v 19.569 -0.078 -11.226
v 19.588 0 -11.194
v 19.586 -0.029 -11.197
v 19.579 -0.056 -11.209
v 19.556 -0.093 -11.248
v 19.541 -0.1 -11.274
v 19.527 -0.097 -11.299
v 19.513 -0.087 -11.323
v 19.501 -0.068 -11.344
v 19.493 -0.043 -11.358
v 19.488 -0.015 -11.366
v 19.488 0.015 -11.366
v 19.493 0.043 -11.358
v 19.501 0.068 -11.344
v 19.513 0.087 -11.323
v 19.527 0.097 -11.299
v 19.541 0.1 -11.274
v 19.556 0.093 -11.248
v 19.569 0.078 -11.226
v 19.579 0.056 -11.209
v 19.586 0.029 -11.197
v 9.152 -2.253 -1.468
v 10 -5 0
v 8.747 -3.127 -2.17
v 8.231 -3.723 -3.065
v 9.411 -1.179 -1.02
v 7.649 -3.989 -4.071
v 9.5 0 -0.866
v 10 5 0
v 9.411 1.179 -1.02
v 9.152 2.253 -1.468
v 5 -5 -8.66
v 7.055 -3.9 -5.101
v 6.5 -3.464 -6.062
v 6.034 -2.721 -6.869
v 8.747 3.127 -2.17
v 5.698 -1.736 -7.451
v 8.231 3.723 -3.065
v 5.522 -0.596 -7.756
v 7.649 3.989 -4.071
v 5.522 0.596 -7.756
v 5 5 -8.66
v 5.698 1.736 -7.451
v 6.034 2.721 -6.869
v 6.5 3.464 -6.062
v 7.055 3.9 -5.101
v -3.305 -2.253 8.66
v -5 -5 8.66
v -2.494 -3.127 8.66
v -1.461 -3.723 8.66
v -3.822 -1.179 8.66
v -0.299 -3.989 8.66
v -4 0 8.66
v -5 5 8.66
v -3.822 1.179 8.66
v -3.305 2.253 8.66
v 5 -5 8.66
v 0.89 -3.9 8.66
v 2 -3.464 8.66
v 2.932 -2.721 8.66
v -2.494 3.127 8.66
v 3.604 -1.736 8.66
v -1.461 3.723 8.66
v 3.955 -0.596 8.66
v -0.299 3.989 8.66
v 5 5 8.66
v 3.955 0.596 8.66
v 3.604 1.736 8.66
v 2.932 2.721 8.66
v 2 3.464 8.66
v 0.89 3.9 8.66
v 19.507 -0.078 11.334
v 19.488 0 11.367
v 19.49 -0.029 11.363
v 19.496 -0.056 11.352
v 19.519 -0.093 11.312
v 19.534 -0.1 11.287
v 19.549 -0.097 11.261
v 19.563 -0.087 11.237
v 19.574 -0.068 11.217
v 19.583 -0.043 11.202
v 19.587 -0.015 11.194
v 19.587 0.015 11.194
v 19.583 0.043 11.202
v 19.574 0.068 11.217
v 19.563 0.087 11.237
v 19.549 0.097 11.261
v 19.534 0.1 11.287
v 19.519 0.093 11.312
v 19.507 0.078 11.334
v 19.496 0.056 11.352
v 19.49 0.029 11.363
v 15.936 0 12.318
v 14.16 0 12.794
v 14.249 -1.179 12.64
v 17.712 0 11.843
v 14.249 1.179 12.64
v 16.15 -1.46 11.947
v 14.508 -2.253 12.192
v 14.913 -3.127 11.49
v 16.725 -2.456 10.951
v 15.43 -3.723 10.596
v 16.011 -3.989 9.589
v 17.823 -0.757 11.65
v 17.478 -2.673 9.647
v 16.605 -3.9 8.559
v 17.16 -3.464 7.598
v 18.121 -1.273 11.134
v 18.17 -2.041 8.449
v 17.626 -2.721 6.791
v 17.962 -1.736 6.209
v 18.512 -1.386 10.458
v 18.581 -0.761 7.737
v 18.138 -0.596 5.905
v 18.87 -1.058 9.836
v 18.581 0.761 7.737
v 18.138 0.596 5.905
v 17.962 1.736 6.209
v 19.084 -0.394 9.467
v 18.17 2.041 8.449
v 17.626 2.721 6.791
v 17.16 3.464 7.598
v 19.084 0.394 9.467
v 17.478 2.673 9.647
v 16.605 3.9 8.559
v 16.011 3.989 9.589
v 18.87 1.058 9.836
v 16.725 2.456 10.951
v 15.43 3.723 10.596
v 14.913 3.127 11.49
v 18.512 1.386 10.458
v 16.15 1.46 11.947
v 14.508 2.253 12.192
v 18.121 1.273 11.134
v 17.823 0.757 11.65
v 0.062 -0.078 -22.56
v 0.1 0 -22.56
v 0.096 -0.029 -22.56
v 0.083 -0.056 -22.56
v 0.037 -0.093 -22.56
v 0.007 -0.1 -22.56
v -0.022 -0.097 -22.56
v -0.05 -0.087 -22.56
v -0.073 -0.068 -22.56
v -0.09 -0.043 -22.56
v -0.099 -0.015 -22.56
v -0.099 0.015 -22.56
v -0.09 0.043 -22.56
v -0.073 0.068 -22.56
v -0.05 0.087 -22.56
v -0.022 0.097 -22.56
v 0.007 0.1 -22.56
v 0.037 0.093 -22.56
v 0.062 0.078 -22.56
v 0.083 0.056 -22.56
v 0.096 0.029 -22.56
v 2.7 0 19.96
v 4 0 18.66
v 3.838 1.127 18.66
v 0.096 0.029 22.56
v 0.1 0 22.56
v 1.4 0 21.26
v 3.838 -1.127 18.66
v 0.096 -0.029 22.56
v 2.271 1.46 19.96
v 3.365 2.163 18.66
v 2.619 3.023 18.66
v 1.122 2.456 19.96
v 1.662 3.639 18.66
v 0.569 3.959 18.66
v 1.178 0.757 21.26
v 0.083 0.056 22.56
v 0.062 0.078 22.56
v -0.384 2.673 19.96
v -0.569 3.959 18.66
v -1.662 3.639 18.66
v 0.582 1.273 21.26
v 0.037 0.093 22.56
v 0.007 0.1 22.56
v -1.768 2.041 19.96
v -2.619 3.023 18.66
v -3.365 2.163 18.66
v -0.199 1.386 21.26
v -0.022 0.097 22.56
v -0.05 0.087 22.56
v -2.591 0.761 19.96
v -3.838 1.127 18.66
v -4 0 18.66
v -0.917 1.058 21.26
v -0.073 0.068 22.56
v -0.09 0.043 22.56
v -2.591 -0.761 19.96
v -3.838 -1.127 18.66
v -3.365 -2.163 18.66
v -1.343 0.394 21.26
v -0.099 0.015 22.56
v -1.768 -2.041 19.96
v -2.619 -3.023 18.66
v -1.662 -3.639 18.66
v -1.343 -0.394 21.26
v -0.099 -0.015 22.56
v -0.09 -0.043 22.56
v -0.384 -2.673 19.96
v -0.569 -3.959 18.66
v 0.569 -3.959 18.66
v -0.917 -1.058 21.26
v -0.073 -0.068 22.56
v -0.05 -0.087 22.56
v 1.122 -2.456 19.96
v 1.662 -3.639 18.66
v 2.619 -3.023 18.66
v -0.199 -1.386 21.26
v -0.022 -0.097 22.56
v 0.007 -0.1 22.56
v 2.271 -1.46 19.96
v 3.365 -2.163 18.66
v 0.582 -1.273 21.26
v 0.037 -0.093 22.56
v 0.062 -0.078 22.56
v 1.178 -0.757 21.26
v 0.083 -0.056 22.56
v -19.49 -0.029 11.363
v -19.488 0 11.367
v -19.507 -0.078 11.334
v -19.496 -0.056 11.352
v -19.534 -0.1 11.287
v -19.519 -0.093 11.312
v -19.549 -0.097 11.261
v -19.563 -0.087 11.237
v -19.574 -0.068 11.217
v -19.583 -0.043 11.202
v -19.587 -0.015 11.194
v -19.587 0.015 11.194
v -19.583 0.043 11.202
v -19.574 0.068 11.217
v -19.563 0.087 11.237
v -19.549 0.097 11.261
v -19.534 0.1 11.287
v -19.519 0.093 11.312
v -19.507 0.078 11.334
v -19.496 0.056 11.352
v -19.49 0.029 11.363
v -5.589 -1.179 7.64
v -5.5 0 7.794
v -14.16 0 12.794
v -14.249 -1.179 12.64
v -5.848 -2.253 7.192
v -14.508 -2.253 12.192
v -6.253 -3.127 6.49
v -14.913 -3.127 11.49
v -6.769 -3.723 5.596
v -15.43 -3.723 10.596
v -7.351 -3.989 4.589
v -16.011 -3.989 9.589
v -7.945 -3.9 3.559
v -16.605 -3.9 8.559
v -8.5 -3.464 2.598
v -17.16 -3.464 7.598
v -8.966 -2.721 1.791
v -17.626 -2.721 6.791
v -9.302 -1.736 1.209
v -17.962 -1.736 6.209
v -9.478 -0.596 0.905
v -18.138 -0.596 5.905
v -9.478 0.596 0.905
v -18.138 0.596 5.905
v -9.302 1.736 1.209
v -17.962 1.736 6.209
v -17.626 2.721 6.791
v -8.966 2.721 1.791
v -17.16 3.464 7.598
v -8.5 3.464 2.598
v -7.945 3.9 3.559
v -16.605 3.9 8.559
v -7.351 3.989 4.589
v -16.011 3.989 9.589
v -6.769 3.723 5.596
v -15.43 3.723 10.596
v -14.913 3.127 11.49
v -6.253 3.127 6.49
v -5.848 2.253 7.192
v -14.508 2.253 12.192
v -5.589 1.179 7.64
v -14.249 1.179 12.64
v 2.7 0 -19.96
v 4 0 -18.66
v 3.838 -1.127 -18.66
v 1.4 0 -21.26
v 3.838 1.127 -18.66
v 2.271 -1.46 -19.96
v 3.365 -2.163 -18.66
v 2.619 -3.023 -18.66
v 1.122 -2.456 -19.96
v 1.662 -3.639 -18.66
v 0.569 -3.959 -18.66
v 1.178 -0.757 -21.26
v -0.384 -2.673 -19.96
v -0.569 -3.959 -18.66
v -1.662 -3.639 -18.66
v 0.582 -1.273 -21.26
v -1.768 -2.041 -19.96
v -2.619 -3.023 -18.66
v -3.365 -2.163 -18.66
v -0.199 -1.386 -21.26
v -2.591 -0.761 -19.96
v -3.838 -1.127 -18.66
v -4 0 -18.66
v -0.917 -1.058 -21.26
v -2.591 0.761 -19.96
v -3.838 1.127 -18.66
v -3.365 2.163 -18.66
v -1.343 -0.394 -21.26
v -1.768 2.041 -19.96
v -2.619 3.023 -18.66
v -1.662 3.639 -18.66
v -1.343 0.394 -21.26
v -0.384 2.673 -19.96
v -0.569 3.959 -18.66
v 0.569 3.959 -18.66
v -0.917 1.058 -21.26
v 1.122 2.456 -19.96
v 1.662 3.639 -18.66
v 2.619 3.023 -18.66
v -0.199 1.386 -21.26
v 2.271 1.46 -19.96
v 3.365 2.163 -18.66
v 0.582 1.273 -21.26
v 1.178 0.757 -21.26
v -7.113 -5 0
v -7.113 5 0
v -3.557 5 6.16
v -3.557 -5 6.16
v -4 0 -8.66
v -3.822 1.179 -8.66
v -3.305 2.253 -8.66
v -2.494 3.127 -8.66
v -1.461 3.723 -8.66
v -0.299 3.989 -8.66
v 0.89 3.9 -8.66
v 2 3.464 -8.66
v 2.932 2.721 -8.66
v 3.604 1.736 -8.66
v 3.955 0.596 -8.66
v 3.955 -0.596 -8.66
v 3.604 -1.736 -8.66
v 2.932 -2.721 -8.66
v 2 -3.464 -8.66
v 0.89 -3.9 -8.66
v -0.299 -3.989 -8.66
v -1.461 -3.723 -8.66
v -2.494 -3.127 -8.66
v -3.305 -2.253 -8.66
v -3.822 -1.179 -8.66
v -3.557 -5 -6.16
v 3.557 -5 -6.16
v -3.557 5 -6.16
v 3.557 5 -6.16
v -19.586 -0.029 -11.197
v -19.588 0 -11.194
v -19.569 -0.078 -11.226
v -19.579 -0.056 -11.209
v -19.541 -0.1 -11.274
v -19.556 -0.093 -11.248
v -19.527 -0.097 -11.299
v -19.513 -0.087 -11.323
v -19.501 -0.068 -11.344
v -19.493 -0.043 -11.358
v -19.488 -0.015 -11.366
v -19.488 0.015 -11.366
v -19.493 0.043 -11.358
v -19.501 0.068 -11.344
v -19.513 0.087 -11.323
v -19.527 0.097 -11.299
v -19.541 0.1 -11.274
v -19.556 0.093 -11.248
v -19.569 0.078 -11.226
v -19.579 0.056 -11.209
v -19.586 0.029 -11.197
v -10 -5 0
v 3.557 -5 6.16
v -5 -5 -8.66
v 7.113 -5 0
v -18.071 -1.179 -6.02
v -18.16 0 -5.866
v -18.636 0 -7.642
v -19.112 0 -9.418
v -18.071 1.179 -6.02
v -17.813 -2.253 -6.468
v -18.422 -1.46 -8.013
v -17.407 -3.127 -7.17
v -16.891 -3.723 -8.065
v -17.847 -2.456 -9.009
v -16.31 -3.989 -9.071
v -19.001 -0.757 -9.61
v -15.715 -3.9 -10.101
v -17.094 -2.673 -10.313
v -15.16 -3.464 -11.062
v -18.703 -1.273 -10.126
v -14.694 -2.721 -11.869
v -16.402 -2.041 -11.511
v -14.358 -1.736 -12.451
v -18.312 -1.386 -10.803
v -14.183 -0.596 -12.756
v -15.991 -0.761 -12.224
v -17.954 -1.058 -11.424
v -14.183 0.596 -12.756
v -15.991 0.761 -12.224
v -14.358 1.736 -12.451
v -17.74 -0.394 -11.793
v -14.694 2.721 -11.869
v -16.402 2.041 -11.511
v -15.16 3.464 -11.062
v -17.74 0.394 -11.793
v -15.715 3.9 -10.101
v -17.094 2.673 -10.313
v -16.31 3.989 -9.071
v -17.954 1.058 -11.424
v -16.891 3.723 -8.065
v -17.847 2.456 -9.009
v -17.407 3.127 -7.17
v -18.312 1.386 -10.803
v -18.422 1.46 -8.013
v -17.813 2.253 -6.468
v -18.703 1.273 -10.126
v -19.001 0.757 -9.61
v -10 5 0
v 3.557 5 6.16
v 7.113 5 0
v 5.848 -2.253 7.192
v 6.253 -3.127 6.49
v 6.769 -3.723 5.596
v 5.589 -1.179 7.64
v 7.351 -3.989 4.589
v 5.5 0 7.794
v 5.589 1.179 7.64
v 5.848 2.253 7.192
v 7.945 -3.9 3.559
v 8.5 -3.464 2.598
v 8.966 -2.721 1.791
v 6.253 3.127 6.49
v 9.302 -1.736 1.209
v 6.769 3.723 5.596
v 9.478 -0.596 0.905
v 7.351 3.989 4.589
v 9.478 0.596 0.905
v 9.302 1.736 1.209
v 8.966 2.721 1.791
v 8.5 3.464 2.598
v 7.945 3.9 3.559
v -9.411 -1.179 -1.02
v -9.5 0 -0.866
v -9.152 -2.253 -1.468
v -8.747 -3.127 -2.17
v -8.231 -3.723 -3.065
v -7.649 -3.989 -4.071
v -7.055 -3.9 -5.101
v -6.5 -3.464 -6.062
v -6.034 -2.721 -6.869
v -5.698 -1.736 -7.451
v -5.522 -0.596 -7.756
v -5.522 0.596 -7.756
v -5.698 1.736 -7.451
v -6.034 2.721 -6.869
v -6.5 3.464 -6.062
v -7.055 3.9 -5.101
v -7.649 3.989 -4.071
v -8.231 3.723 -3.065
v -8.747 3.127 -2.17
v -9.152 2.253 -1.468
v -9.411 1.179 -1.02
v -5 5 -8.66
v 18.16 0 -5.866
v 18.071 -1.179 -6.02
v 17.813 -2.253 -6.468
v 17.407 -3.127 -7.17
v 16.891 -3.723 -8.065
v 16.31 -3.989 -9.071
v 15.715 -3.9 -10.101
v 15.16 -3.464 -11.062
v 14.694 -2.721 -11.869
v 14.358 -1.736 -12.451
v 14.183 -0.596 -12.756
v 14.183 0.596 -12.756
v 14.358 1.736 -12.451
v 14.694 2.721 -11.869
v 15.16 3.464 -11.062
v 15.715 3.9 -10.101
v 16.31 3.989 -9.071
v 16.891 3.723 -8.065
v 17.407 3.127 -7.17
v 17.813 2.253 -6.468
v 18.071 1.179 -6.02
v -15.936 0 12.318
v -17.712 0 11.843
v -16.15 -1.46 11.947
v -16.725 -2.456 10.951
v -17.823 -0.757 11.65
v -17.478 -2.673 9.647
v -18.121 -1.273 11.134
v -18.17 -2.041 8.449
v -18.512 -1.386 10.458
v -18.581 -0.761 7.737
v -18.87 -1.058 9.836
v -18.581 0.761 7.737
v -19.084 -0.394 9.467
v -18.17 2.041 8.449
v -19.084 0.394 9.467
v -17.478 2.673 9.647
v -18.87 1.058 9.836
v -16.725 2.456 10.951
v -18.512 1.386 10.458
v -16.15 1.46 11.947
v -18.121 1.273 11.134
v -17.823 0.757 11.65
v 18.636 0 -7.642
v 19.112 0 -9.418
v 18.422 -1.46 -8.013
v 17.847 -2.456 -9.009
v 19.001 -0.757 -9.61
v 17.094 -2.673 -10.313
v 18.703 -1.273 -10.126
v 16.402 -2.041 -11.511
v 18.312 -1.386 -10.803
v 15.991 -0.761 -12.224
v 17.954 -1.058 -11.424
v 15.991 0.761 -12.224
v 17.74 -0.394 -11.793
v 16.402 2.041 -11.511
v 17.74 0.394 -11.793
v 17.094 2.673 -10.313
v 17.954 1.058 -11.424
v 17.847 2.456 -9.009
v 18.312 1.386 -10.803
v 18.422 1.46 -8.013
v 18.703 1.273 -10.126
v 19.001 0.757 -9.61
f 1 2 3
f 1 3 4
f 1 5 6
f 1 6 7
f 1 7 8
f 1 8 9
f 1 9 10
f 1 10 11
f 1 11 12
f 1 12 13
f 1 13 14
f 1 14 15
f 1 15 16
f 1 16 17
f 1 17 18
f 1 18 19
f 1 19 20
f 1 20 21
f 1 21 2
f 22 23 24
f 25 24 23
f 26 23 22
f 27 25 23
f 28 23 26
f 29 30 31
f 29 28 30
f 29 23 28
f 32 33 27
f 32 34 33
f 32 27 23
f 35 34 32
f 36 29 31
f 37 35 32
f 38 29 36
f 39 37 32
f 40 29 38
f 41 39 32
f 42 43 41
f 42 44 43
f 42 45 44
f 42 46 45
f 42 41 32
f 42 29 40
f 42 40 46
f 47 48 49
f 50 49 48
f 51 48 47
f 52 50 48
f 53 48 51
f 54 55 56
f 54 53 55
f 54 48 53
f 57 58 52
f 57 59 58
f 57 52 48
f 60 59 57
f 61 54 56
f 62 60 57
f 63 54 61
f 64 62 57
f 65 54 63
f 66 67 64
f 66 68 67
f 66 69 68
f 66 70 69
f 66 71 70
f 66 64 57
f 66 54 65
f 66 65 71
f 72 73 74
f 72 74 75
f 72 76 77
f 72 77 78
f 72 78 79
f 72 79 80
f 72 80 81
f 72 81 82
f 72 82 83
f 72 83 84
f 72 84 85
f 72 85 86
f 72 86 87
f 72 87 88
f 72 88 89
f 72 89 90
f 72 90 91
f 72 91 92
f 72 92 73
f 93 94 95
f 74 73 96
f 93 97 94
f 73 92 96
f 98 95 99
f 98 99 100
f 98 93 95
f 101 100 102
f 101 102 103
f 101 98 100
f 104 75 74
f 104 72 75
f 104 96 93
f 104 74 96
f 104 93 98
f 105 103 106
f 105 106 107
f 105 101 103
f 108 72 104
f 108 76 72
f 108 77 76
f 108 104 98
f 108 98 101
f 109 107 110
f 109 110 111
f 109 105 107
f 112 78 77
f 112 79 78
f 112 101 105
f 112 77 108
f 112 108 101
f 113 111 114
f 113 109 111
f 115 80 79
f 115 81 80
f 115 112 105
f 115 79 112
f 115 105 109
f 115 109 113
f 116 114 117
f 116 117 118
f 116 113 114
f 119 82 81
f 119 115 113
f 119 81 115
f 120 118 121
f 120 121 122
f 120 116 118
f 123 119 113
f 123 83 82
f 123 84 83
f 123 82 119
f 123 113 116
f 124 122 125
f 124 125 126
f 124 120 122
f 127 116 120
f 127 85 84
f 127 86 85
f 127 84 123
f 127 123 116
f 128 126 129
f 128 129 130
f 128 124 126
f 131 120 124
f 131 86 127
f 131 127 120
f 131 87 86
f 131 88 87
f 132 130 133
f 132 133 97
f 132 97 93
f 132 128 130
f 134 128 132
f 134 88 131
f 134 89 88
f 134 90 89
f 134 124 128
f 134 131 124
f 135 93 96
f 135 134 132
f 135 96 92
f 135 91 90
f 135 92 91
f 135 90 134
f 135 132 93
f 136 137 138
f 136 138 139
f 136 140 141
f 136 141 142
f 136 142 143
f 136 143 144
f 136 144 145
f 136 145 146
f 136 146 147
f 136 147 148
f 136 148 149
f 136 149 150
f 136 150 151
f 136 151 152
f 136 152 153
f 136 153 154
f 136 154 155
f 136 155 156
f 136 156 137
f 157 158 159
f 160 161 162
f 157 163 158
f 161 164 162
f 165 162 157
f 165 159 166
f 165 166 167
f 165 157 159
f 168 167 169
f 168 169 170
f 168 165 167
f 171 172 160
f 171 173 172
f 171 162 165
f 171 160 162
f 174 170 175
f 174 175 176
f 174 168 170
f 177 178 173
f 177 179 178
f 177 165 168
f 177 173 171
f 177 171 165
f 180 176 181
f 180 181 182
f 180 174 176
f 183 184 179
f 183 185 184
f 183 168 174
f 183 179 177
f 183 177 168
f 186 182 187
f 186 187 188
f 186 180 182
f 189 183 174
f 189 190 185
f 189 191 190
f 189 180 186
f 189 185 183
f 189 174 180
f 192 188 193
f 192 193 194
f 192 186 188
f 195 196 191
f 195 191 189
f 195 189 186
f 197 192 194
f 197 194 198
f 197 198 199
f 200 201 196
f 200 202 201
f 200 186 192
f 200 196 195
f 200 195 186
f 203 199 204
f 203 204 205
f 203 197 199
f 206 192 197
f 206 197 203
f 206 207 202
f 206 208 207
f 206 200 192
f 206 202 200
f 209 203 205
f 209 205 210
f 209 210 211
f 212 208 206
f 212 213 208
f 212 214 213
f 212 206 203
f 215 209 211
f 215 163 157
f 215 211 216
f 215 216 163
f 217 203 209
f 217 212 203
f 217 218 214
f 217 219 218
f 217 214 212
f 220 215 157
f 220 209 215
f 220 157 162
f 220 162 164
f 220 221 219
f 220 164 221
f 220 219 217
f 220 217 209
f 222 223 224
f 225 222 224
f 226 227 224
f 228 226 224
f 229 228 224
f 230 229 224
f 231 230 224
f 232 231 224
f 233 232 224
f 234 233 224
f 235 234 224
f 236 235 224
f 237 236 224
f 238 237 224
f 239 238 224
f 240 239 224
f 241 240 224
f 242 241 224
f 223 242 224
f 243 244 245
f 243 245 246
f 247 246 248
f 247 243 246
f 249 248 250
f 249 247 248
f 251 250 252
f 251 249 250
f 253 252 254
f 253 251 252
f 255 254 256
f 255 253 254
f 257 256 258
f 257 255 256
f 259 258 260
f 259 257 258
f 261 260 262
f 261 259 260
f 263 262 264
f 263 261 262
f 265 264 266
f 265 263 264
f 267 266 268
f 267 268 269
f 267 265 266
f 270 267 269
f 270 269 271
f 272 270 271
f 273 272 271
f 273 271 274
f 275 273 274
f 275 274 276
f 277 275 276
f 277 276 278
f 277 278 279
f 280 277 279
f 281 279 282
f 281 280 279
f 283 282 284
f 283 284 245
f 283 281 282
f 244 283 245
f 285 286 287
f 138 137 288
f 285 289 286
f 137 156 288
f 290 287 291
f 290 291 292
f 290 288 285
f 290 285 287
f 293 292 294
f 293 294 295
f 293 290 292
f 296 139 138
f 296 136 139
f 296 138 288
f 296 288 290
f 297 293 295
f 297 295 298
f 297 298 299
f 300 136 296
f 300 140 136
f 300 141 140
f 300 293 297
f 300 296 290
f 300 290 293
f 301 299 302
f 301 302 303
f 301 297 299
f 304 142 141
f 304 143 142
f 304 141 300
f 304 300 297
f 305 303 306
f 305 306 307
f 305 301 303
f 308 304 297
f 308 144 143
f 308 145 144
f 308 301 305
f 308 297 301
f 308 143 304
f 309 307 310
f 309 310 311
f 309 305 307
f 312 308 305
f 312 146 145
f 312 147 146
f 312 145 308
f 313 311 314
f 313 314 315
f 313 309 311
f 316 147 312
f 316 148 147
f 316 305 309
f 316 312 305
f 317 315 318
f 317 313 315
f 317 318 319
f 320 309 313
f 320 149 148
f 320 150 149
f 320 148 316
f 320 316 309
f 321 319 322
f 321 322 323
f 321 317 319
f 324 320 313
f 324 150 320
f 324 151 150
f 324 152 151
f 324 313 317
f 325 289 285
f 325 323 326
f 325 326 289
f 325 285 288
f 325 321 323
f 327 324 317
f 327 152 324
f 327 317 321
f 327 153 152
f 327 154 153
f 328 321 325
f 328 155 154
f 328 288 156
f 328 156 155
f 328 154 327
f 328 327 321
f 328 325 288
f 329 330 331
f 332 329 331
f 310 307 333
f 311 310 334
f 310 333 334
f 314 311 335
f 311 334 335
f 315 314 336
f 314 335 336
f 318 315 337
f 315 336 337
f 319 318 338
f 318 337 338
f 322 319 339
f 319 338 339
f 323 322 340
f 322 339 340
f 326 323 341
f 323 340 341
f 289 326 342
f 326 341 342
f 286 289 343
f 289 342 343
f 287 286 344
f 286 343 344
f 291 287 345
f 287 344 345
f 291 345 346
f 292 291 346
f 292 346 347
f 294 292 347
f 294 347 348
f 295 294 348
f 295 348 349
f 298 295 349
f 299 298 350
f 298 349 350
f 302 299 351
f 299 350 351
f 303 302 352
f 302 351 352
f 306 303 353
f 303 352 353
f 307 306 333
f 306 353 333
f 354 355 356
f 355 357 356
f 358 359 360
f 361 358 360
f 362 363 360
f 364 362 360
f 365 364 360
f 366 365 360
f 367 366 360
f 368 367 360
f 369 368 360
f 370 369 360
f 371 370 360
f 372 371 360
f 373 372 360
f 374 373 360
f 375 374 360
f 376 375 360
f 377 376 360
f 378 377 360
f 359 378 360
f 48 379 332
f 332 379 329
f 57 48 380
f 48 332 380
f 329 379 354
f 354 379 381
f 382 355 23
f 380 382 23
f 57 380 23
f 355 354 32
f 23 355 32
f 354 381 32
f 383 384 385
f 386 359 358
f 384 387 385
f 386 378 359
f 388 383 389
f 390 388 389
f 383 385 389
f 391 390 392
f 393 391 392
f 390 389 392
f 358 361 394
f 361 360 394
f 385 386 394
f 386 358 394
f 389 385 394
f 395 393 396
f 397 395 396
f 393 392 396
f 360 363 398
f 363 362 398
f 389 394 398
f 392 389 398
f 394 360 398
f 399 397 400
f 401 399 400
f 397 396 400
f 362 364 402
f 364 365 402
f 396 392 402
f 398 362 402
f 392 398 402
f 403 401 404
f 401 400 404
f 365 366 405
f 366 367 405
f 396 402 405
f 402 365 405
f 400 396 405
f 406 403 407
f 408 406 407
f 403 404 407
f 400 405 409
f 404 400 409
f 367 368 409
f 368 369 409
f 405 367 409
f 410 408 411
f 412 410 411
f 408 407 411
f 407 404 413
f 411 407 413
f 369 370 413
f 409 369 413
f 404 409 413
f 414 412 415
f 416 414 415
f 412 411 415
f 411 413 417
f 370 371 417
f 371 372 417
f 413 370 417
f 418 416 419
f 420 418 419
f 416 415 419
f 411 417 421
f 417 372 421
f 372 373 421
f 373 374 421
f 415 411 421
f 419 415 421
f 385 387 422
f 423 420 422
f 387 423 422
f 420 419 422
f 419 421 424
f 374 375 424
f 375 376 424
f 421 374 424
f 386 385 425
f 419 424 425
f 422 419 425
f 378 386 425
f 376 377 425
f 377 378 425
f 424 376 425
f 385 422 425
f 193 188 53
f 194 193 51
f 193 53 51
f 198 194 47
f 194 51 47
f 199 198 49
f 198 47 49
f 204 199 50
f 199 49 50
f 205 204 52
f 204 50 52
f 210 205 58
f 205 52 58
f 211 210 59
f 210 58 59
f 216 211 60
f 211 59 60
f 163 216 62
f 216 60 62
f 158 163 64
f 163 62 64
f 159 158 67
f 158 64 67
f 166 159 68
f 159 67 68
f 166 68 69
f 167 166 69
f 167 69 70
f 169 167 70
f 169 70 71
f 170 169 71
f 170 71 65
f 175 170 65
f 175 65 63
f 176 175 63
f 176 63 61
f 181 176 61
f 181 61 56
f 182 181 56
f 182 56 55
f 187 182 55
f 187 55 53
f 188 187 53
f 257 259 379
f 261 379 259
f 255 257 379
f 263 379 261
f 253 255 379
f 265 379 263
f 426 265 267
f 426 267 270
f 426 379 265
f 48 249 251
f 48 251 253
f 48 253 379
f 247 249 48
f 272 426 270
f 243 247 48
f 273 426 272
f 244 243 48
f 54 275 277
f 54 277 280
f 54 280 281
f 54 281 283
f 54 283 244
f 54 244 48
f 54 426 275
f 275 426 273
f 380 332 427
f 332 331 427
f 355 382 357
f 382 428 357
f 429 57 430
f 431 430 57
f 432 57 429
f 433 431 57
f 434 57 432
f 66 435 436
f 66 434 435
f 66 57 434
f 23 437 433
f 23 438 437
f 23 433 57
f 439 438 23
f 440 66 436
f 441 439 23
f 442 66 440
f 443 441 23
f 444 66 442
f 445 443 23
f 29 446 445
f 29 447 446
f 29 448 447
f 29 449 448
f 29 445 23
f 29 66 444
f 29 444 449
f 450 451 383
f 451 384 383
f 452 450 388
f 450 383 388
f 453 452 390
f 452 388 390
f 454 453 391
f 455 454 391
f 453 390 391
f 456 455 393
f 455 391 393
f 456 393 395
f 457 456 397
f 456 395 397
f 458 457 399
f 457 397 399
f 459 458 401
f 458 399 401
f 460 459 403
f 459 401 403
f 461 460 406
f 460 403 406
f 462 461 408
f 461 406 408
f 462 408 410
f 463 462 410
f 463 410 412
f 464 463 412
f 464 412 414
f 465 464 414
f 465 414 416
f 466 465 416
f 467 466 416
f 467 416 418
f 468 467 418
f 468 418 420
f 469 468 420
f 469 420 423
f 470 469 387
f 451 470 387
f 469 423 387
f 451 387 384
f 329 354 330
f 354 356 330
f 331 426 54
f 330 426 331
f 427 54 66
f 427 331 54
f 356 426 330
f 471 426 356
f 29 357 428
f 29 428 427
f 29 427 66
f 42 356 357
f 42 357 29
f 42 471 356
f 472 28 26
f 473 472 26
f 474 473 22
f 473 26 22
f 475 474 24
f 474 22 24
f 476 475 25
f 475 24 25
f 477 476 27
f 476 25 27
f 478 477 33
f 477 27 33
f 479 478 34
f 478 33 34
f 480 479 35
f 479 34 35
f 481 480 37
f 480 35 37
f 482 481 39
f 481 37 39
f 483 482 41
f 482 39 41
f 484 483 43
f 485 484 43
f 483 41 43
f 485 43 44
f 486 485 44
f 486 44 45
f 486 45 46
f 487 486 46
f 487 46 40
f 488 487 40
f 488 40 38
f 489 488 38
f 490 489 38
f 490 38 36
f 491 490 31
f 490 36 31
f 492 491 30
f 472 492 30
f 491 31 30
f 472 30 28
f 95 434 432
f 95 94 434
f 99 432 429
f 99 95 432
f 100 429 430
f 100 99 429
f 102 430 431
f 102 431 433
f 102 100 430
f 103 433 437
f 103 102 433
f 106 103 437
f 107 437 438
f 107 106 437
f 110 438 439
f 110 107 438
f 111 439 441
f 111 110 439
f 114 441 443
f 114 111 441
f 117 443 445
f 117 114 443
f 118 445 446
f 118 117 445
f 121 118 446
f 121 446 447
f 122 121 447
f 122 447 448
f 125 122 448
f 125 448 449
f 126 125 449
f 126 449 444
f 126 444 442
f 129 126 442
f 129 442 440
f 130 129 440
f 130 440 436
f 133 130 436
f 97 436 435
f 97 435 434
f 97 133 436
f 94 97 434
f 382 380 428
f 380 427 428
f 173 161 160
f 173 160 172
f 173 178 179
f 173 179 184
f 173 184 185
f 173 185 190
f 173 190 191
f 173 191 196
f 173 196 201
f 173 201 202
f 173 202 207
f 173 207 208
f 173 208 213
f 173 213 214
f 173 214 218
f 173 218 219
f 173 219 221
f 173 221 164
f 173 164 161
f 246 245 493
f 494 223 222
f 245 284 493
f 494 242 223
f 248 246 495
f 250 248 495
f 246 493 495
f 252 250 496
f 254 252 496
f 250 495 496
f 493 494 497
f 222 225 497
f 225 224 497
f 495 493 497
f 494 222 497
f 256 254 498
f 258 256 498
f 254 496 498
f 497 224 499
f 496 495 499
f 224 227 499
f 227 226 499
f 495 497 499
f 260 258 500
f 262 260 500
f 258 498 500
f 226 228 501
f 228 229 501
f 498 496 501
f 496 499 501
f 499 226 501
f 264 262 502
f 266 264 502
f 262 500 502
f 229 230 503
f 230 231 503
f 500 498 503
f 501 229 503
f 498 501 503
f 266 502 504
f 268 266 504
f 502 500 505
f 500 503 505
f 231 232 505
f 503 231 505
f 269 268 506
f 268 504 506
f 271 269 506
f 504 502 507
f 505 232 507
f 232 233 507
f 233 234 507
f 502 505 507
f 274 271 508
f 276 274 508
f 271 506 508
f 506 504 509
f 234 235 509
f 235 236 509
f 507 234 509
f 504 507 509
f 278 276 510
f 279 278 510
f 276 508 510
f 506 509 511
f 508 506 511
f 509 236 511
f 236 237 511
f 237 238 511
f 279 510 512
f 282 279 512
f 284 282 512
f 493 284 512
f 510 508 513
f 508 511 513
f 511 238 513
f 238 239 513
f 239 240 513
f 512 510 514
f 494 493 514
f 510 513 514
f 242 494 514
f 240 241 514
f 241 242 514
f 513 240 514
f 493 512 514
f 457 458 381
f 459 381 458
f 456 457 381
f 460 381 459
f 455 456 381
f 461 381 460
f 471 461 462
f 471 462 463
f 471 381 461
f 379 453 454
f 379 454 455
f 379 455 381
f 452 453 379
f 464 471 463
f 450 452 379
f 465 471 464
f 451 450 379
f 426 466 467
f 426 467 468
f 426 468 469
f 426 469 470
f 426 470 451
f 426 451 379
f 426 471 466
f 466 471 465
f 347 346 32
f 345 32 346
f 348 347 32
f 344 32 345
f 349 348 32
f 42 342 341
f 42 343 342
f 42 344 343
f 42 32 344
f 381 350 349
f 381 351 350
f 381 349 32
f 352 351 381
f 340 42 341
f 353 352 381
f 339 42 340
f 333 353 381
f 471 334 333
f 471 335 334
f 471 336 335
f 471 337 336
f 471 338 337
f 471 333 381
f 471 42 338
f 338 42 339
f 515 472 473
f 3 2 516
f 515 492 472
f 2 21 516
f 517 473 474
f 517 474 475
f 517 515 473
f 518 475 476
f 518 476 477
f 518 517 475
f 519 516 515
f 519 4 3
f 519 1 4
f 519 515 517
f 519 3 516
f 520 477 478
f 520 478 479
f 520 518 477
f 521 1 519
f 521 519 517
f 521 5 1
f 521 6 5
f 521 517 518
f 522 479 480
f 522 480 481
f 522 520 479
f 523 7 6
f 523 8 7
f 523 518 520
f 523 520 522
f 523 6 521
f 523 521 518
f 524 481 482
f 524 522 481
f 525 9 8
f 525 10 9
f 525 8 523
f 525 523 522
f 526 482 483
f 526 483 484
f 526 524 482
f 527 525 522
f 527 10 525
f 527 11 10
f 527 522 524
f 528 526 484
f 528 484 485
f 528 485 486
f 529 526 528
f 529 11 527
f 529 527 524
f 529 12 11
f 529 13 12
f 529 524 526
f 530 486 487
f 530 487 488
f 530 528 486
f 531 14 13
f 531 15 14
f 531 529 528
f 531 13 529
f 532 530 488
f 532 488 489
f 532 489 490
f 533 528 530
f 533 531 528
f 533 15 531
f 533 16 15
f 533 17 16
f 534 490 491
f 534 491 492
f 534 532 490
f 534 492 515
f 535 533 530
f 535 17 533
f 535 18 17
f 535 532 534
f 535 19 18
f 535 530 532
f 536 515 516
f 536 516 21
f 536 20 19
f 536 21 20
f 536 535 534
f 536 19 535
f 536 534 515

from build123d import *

# Parameters (mm, degrees)
BOSS_EXTRUDE1_DEPTH     = 5
SKETCH2_R               = 4
BOSS_EXTRUDE2_DEPTH     = 10
SKETCH6_R               = 4
BOSS_EXTRUDE3_DEPTH     = 10
MIRROR2_COPY_1_SKETCH_R = 4
MIRROR2_COPY_1_DEPTH    = 10
MIRROR2_COPY_3_SKETCH_R = 4
MIRROR2_COPY_3_DEPTH    = 10


with BuildPart() as part:
    # Sketch1 → Boss-Extrude1 (new, symmetric)
    with BuildSketch(Plane(origin=(0, 0, 0), x_dir=(1, 0, 0), z_dir=(0, 1, 0))):
        Polygon((5, 8.660254038), (-5, 8.660254038), (-10, 0), (-5, -8.660254038), (5, -8.660254038), (10, 0), align=None)
        Polygon((-7.113248654, 0), (-3.556624327, -6.160254038), (3.556624327, -6.160254038), (7.113248654, 0), (3.556624327, 6.160254038), (-3.556624327, 6.160254038), align=None, mode=Mode.SUBTRACT)
    extrude(amount=BOSS_EXTRUDE1_DEPTH, both=True)

    # Sketch2 → Boss-Extrude2 (add)
    with BuildSketch(Plane(origin=(0, 0, -8.660254038), x_dir=(-1, 0, 0), z_dir=(0, 0, -1))):
        Circle(SKETCH2_R)
    extrude(amount=BOSS_EXTRUDE2_DEPTH)

    # Sketch3 → Revolve1 (revolve)
    with BuildSketch(Plane(origin=(0, 0, 0), x_dir=(0, 0, -1), z_dir=(1, 0, 0)), mode=Mode.PRIVATE) as revolve1_sk:
        Polygon((18.660254038, 4), (22.560254038, 0.1), (22.560254038, 0), (18.660254038, 0), align=None)
    revolve(revolve1_sk.sketch.rotate(Axis((0, 0, 981.339745962), (0, 0, -1)), 90), axis=Axis((0, 0, 981.339745962), (0, 0, -1)))

    # Sketch6 → Boss-Extrude3 (add)
    with BuildSketch(Plane(origin=(7.5, 0, -4.330127019), x_dir=(-0.49999999999999983, 0, -0.8660254037844388), z_dir=(0.8660254037844387, 0, -0.4999999999999998))):
        with Locations(Location((0, 0, 0), (0, 0, 180))):
            Circle(SKETCH6_R)
    boss_extrude3 = extrude(amount=BOSS_EXTRUDE3_DEPTH)

    # Sketch9 → Revolve4 (revolve)
    with BuildSketch(Plane(origin=(0, 0, 0), x_dir=(1, 0, 0), z_dir=(0, 1, 0)), mode=Mode.PRIVATE) as revolve4_sk:
        Polygon((14.160254038, 12.794228634), (19.487753113, 11.366729559), (19.537753113, 11.280127019), (16.160254038, 9.330127019), align=None)
    revolve4 = revolve(revolve4_sk.sketch.rotate(Axis((0, 0, 0), (0.8660254037844387, 0, -0.5000000000000001)), 180), axis=Axis((0, 0, 0), (0.8660254037844387, 0, -0.5000000000000001)))

    # Sketch10 → Revolve5 (revolve)
    with BuildSketch(Plane(origin=(0, 0, 0), x_dir=(1, 0, 0), z_dir=(0, 1, 0)), mode=Mode.PRIVATE) as revolve5_sk:
        Polygon((9.5, -0.866025404), (18.160254038, -5.866025404), (19.587753113, -11.193524479), (19.537753113, -11.280127019), (7.5, -4.330127019), align=None)
    revolve5 = revolve(revolve5_sk.sketch.rotate(Axis((0, 0, 0), (0.8660254037844387, 0, 0.5)), 180), axis=Axis((0, 0, 0), (0.8660254037844387, 0, 0.5)))

    # Mirror1: Boss-Extrude3, Revolve4 across plane
    add(boss_extrude3.mirror(Plane(origin=(0, 0, 0), x_dir=(0.49999999999999983, 0, 0.8660254037844387), z_dir=(0.8660254037844388, 0, -0.49999999999999983))))
    add(revolve4.mirror(Plane(origin=(0, 0, 0), x_dir=(0.49999999999999983, 0, 0.8660254037844387), z_dir=(0.8660254037844388, 0, -0.49999999999999983))))

    # Mirror2: Revolve5 across plane
    add(revolve5.mirror(Plane(origin=(0, 0, 0), x_dir=(-0.49999999999999983, 0, 0.8660254037844387), z_dir=(0.8660254037844388, 0, 0.49999999999999983))))

    # Mirror2 copy 1 sketch → Mirror2 copy 1 (add)
    with BuildSketch(Plane.XY.offset(8.660254038)):
        with Locations(Location((0, 0, 0), (0, 0, 180))):
            Circle(MIRROR2_COPY_1_SKETCH_R)
    extrude(amount=MIRROR2_COPY_1_DEPTH)

    # Mirror2 copy 2 sketch → Mirror2 copy 2 (revolve)
    with BuildSketch(Plane(origin=(0, 0, 0), x_dir=(-0.499999999999999, 0, 0.8660254037844393), z_dir=(0, 1, 0))):
        Polygon((14.160254038, 12.794228634), (19.487753113, 11.366729559), (19.537753113, 11.280127019), (16.160254038, 9.330127019), align=None)
    revolve(axis=Axis((0, 0, 0), (0, 0, 1)))

    # Mirror2 copy 3 sketch → Mirror2 copy 3 (add)
    with BuildSketch(Plane(origin=(0, 0, -8.660254038), x_dir=(1, 0, 0), z_dir=(0, 0, -1))):
        Circle(MIRROR2_COPY_3_SKETCH_R)
    extrude(amount=MIRROR2_COPY_3_DEPTH)

    # Mirror2 copy 4 sketch → Mirror2 copy 4 (revolve)
    with BuildSketch(Plane(origin=(0, 0, 0), x_dir=(-0.5000000000000007, 0, -0.8660254037844385), z_dir=(0, 1, 0))):
        Polygon((14.160254038, -12.794228634), (19.487753113, -11.366729559), (19.537753113, -11.280127019), (16.160254038, -9.330127019), align=None)
    revolve(axis=Axis((0, 0, 0), (0, 0, 1)))


solid = part.part
